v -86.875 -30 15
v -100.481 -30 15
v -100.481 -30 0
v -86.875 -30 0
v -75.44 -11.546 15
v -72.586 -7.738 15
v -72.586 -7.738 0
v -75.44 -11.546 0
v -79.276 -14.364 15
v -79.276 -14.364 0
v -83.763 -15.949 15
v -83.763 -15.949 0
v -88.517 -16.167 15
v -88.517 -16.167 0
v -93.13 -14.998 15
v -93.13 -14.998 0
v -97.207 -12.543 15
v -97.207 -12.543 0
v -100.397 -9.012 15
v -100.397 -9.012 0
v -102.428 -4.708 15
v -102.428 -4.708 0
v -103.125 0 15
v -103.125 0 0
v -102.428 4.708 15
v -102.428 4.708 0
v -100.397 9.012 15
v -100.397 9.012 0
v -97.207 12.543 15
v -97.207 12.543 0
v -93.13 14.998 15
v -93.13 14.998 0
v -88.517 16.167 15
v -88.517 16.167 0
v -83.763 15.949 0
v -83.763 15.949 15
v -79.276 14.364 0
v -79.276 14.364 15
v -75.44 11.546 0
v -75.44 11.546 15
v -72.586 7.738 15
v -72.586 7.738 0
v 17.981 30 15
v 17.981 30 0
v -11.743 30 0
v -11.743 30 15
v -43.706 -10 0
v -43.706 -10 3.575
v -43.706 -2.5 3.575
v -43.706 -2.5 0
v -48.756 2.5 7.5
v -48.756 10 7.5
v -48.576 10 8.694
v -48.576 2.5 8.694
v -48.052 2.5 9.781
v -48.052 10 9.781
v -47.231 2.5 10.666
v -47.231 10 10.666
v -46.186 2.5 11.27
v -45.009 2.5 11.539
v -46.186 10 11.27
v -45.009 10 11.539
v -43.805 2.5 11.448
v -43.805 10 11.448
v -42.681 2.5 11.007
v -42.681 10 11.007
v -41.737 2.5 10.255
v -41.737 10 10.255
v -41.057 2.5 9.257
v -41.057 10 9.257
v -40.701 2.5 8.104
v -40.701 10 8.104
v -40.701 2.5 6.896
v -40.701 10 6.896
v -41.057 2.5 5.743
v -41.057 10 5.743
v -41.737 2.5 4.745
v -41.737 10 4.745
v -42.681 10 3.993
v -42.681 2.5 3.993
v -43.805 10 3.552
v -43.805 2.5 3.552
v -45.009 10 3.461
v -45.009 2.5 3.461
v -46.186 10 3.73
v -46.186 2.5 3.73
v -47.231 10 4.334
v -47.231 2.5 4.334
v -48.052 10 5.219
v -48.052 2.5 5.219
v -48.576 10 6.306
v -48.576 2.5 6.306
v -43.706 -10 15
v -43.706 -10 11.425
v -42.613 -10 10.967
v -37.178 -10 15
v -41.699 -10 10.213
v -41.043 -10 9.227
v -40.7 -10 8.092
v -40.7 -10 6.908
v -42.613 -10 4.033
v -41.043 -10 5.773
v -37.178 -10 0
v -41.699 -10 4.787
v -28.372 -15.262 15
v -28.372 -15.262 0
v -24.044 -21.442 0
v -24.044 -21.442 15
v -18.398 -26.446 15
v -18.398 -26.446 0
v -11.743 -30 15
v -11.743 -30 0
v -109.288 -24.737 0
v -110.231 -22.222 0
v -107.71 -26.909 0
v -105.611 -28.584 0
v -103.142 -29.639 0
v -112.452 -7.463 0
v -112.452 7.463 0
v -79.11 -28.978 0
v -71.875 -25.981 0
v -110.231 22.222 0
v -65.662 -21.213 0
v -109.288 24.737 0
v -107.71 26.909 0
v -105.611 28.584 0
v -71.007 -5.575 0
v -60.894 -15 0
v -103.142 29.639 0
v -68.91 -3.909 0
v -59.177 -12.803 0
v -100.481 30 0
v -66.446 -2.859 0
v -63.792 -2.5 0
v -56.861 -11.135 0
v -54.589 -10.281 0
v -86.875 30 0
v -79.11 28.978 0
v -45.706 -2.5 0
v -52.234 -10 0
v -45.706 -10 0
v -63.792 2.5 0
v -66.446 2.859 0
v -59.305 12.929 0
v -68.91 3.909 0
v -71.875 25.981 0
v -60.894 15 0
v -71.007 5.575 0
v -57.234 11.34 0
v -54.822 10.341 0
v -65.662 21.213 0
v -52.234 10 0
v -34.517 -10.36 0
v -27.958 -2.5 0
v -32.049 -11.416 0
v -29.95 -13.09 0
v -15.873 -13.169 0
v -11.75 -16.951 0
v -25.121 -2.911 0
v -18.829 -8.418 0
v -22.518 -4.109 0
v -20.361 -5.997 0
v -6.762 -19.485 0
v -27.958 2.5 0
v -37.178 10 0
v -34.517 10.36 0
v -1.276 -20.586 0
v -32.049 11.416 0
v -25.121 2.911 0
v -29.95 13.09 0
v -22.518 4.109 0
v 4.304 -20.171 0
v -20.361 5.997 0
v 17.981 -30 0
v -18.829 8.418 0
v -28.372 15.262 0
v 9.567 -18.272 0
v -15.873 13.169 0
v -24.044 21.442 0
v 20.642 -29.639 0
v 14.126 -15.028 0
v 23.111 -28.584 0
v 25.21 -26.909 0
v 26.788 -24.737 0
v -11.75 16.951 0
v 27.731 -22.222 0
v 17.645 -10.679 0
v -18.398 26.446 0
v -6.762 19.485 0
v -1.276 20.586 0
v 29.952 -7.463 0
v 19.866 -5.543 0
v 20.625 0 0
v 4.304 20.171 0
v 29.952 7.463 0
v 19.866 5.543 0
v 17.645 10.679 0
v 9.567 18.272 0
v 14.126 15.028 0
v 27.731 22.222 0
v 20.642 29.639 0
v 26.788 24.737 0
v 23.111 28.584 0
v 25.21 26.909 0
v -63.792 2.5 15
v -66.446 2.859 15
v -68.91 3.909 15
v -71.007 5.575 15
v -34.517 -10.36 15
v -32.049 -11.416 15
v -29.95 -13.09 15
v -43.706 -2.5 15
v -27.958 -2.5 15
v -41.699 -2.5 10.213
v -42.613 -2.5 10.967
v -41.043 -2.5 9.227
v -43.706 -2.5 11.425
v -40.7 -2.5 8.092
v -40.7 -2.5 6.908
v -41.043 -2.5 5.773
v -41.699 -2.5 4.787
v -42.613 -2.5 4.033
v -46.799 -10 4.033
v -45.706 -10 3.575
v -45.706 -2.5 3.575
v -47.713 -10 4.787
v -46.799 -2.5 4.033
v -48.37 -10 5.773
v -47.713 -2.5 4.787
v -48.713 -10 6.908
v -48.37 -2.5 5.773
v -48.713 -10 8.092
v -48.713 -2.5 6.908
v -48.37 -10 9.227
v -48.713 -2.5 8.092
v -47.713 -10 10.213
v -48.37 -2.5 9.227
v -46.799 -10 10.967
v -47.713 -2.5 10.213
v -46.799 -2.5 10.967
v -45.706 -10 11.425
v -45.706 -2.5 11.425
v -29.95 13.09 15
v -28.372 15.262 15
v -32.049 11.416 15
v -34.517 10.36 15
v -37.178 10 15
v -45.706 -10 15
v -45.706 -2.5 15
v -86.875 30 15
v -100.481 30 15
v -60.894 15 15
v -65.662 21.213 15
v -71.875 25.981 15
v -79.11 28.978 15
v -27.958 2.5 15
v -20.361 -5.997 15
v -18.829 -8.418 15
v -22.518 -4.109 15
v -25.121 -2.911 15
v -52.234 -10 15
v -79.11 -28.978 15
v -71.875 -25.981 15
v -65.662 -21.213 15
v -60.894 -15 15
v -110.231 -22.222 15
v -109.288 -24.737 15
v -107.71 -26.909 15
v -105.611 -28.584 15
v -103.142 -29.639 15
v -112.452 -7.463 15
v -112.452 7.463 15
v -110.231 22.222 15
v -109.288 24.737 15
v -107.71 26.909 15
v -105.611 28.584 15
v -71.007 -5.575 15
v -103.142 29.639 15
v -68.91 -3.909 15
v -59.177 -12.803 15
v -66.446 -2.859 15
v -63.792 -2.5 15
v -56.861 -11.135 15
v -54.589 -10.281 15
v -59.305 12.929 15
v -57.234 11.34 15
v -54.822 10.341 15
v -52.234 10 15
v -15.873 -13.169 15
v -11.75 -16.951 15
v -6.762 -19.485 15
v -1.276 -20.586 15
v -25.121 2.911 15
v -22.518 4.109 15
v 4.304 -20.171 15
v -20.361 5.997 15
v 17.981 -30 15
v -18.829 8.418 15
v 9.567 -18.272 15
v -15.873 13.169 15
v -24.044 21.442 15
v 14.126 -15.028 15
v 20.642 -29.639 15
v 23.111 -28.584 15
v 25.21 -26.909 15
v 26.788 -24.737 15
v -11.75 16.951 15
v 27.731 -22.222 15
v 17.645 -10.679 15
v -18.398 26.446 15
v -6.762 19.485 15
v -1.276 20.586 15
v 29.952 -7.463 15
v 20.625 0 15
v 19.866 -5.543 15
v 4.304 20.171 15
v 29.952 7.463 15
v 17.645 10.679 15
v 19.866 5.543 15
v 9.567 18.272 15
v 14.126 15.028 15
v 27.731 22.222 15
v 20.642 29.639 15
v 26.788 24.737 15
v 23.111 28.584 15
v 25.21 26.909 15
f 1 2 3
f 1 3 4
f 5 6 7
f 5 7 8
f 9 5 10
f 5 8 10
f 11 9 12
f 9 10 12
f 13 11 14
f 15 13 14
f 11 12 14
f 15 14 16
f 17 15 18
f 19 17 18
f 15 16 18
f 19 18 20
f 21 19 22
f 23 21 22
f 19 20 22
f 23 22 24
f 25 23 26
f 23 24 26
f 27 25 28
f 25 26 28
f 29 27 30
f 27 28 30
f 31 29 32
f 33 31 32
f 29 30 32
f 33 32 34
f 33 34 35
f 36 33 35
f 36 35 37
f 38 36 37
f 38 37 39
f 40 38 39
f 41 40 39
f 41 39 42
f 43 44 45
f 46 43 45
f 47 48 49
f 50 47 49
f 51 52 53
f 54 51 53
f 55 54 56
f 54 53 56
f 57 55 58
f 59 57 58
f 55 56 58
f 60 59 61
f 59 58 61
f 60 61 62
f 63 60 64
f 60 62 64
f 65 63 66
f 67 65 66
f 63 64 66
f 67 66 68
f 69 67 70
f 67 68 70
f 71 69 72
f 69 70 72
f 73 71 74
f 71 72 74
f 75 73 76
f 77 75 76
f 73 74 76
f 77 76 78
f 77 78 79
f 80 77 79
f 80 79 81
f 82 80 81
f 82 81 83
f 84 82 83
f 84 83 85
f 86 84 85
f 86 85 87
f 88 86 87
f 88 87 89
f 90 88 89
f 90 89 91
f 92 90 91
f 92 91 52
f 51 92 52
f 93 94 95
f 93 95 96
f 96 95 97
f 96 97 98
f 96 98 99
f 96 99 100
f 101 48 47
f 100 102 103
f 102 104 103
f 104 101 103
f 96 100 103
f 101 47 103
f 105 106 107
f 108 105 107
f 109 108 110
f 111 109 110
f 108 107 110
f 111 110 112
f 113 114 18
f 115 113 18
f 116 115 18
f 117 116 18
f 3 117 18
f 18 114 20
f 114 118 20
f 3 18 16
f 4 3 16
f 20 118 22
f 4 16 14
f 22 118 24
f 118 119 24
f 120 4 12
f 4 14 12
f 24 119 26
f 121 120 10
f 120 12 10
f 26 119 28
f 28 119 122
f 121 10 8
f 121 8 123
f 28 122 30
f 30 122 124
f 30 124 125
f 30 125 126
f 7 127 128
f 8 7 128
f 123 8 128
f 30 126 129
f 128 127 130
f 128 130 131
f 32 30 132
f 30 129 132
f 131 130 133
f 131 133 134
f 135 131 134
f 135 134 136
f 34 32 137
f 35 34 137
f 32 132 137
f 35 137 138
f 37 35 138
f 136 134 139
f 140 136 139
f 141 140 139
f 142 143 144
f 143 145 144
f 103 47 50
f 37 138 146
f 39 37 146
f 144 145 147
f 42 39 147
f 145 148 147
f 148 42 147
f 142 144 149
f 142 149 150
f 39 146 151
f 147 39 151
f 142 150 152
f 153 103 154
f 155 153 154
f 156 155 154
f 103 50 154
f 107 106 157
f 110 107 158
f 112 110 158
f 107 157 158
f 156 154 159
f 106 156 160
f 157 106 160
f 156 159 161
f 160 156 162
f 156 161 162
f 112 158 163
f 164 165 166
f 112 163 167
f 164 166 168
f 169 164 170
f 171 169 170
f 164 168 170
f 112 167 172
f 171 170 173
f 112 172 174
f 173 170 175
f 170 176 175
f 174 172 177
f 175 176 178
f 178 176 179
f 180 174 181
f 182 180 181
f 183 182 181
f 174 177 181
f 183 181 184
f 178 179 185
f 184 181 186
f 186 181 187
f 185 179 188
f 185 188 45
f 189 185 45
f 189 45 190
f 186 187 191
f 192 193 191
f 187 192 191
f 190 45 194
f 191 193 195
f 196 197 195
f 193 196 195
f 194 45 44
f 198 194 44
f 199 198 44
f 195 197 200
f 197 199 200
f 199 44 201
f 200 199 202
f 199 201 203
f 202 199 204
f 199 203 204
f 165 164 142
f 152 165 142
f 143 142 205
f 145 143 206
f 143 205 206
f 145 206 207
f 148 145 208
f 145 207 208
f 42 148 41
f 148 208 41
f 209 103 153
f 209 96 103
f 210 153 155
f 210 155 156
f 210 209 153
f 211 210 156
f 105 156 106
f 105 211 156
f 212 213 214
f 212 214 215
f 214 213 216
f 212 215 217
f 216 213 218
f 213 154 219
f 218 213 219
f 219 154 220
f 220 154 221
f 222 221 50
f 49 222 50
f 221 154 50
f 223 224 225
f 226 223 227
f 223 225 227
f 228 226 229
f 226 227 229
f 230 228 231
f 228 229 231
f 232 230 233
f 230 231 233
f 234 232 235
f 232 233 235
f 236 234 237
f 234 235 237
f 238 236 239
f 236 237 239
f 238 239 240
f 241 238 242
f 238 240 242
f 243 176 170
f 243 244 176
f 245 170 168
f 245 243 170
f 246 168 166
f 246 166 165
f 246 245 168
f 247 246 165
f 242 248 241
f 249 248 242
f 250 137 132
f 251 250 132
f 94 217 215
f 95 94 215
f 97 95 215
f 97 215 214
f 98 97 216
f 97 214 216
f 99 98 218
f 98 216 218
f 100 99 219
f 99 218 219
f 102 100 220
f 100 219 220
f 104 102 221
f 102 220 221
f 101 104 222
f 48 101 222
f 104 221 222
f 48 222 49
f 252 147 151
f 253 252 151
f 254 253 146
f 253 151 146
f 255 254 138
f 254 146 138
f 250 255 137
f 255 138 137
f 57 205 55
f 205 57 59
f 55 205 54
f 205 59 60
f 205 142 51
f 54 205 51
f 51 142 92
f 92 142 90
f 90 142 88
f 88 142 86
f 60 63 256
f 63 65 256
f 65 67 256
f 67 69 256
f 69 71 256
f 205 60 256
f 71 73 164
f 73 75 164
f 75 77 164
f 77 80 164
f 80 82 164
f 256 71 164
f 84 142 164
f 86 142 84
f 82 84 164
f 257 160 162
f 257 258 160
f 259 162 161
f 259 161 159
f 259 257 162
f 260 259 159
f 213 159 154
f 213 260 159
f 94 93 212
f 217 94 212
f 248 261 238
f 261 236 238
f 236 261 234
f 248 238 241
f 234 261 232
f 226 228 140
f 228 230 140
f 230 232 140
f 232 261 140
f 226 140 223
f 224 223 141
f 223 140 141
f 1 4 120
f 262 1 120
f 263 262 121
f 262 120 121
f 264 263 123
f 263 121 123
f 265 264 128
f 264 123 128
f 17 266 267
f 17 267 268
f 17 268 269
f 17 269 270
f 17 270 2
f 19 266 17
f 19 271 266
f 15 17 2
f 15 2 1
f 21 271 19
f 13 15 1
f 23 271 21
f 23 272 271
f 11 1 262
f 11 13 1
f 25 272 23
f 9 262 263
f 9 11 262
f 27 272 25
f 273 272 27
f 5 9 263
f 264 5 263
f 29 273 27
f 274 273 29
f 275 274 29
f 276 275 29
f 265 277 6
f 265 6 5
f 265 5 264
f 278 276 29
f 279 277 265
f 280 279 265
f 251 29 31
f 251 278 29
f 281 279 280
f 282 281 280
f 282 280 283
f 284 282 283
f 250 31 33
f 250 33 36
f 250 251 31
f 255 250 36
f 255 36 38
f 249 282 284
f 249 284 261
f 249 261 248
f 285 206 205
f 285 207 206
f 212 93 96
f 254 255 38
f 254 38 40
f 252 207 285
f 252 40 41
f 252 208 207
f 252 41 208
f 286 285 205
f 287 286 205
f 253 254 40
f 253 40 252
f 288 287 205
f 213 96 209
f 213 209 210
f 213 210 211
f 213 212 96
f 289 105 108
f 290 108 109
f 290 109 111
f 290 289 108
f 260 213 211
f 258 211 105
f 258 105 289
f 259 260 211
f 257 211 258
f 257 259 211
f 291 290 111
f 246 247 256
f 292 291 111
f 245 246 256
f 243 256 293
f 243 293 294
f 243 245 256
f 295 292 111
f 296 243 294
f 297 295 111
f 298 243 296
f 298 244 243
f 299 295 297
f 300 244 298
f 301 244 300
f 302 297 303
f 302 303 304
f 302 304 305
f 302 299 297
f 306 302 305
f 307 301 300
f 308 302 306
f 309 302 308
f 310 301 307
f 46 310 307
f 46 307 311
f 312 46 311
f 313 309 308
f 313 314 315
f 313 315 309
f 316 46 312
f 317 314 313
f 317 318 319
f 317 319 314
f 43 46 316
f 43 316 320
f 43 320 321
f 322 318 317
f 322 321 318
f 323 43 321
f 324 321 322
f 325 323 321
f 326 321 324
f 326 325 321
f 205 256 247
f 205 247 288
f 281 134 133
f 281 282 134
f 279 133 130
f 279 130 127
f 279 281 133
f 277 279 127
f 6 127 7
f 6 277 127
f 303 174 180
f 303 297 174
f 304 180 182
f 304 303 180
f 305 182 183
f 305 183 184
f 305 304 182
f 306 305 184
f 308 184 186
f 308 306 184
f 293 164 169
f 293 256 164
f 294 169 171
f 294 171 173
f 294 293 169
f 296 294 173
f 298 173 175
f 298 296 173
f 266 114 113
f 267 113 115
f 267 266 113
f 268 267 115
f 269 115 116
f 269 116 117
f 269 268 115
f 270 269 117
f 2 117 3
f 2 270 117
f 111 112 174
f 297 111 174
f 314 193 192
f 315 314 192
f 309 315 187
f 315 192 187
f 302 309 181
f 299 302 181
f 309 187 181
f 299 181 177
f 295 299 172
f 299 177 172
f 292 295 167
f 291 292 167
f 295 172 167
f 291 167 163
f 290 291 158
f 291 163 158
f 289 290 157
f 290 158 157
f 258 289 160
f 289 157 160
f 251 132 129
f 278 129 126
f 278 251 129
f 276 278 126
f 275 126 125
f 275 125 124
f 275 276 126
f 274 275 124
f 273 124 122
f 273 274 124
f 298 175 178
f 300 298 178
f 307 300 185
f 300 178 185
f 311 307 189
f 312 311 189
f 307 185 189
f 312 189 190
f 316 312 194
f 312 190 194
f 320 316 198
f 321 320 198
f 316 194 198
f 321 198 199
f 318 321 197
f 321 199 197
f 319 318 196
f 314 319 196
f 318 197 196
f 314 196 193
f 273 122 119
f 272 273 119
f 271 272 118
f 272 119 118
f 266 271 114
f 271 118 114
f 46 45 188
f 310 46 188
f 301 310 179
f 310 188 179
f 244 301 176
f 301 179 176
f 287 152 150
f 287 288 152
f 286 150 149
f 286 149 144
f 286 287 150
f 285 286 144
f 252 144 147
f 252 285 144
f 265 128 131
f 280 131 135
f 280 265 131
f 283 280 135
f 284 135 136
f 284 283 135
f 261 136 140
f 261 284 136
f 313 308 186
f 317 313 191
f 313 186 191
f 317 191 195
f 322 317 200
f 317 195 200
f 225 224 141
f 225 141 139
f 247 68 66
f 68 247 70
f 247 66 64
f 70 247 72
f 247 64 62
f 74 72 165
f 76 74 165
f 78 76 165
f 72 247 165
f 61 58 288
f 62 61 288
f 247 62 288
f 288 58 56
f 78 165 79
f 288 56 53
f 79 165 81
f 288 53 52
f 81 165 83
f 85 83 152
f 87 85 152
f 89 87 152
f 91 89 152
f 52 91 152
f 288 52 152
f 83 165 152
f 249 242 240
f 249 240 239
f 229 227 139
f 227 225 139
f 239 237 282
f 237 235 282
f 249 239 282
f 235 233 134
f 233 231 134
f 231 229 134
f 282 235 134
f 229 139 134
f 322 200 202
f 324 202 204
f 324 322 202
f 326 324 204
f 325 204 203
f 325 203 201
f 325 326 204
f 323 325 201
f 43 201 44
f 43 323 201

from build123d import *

# Parameters (mm, degrees)
F1_DEPTH = 15
F2_R     = 10
F4_D     = 8.1
F5_W     = 2
F5_H     = 7.5
F6_DEPTH = 15.001


with BuildPart() as f1:
    # F0 (on Top) → F1 (new body)
    with BuildSketch(Plane.XY):
        with BuildLine():
            Line((25.625, -30), (25.625, 30))
            Line((25.625, 30), (-11.742684, 30))
            ThreePointArc((-11.742684, 30), (-23.425524, 22.116407), (-30.625, 10))
            Line((-30.625, 10), (-58.590729, 10))
            ThreePointArc((-58.590729, 10), (-69.554492, 24.494897), (-86.875, 30))
            Line((-86.875, 30), (-108.125, 30))
            Line((-108.125, 30), (-108.125, -30))
            Line((-108.125, -30), (-86.875, -30))
            ThreePointArc((-86.875, -30), (-71.638705, -25.842897), (-60.625, -14.523688))
            Line((-60.625, -14.523688), (-60.625, -10))
            Line((-60.625, -10), (-58.590729, -10))
            Line((-58.590729, -10), (-30.625, -10))
            ThreePointArc((-30.625, -10), (-23.425524, -22.116407), (-11.742684, -30))
            Line((-11.742684, -30), (25.625, -30))
        make_face()
        with BuildLine():
            ThreePointArc((-20.472924, 2.5), (1.252311, 20.586946), (20.625, 0))
            ThreePointArc((20.625, 0), (1.252311, -20.586946), (-20.472924, -2.5))
            Line((-20.472924, -2.5), (-70.818459, -2.5))
            ThreePointArc((-70.818459, -2.5), (-103.125, 0), (-70.818459, 2.5))
            Line((-70.818459, 2.5), (-20.472924, 2.5))
        make_face(mode=Mode.SUBTRACT)
        with BuildLine():
            ThreePointArc((25.625, -30), (30.23108, 0), (25.625, 30))
            Line((25.625, 30), (25.625, -30))
        make_face()
        with BuildLine():
            ThreePointArc((-60.625, -14.523688), (-59.514214, -12.303958), (-58.590729, -10))
            Line((-58.590729, -10), (-60.625, -10))
            Line((-60.625, -10), (-60.625, -14.523688))
        make_face()
        with BuildLine():
            Line((-108.125, -30), (-108.125, 30))
            ThreePointArc((-108.125, 30), (-112.73108, 0), (-108.125, -30))
        make_face()
    extrude(amount=F1_DEPTH)

    # F2
    f2_edges = [f1.edges().sort_by_distance(p)[0] for p in [
        (-108.125, -30, 7.5),
        (-108.125, 30, 7.5),
        (25.625, 30, 7.5),
        (25.625, -30, 7.5),
        (-20.472924, -2.5, 7.5),
        (-20.472924, 2.5, 7.5),
        (-70.818459, 2.5, 7.5),
        (-70.818459, -2.5, 7.5),
        (-58.590729, -10, 7.5),
        (-30.625, -10, 7.5),
        (-30.625, 10, 7.5),
        (-58.590729, 10, 7.5),
    ]]
    fillet(f2_edges, radius=F2_R)

    # F4 (through all)
    with Locations(Plane.XZ.offset(10)):
        with Locations((-44.70608, 7.5)):
            Hole(F4_D / 2)

    # F5 (on face) → F6 (cut, through all)
    with BuildSketch(Plane.XY.offset(15)):
        with Locations((-44.70608, -6.25)):
            Rectangle(F5_W, F5_H)
    extrude(amount=-F6_DEPTH, mode=Mode.SUBTRACT)


solid = f1.part
